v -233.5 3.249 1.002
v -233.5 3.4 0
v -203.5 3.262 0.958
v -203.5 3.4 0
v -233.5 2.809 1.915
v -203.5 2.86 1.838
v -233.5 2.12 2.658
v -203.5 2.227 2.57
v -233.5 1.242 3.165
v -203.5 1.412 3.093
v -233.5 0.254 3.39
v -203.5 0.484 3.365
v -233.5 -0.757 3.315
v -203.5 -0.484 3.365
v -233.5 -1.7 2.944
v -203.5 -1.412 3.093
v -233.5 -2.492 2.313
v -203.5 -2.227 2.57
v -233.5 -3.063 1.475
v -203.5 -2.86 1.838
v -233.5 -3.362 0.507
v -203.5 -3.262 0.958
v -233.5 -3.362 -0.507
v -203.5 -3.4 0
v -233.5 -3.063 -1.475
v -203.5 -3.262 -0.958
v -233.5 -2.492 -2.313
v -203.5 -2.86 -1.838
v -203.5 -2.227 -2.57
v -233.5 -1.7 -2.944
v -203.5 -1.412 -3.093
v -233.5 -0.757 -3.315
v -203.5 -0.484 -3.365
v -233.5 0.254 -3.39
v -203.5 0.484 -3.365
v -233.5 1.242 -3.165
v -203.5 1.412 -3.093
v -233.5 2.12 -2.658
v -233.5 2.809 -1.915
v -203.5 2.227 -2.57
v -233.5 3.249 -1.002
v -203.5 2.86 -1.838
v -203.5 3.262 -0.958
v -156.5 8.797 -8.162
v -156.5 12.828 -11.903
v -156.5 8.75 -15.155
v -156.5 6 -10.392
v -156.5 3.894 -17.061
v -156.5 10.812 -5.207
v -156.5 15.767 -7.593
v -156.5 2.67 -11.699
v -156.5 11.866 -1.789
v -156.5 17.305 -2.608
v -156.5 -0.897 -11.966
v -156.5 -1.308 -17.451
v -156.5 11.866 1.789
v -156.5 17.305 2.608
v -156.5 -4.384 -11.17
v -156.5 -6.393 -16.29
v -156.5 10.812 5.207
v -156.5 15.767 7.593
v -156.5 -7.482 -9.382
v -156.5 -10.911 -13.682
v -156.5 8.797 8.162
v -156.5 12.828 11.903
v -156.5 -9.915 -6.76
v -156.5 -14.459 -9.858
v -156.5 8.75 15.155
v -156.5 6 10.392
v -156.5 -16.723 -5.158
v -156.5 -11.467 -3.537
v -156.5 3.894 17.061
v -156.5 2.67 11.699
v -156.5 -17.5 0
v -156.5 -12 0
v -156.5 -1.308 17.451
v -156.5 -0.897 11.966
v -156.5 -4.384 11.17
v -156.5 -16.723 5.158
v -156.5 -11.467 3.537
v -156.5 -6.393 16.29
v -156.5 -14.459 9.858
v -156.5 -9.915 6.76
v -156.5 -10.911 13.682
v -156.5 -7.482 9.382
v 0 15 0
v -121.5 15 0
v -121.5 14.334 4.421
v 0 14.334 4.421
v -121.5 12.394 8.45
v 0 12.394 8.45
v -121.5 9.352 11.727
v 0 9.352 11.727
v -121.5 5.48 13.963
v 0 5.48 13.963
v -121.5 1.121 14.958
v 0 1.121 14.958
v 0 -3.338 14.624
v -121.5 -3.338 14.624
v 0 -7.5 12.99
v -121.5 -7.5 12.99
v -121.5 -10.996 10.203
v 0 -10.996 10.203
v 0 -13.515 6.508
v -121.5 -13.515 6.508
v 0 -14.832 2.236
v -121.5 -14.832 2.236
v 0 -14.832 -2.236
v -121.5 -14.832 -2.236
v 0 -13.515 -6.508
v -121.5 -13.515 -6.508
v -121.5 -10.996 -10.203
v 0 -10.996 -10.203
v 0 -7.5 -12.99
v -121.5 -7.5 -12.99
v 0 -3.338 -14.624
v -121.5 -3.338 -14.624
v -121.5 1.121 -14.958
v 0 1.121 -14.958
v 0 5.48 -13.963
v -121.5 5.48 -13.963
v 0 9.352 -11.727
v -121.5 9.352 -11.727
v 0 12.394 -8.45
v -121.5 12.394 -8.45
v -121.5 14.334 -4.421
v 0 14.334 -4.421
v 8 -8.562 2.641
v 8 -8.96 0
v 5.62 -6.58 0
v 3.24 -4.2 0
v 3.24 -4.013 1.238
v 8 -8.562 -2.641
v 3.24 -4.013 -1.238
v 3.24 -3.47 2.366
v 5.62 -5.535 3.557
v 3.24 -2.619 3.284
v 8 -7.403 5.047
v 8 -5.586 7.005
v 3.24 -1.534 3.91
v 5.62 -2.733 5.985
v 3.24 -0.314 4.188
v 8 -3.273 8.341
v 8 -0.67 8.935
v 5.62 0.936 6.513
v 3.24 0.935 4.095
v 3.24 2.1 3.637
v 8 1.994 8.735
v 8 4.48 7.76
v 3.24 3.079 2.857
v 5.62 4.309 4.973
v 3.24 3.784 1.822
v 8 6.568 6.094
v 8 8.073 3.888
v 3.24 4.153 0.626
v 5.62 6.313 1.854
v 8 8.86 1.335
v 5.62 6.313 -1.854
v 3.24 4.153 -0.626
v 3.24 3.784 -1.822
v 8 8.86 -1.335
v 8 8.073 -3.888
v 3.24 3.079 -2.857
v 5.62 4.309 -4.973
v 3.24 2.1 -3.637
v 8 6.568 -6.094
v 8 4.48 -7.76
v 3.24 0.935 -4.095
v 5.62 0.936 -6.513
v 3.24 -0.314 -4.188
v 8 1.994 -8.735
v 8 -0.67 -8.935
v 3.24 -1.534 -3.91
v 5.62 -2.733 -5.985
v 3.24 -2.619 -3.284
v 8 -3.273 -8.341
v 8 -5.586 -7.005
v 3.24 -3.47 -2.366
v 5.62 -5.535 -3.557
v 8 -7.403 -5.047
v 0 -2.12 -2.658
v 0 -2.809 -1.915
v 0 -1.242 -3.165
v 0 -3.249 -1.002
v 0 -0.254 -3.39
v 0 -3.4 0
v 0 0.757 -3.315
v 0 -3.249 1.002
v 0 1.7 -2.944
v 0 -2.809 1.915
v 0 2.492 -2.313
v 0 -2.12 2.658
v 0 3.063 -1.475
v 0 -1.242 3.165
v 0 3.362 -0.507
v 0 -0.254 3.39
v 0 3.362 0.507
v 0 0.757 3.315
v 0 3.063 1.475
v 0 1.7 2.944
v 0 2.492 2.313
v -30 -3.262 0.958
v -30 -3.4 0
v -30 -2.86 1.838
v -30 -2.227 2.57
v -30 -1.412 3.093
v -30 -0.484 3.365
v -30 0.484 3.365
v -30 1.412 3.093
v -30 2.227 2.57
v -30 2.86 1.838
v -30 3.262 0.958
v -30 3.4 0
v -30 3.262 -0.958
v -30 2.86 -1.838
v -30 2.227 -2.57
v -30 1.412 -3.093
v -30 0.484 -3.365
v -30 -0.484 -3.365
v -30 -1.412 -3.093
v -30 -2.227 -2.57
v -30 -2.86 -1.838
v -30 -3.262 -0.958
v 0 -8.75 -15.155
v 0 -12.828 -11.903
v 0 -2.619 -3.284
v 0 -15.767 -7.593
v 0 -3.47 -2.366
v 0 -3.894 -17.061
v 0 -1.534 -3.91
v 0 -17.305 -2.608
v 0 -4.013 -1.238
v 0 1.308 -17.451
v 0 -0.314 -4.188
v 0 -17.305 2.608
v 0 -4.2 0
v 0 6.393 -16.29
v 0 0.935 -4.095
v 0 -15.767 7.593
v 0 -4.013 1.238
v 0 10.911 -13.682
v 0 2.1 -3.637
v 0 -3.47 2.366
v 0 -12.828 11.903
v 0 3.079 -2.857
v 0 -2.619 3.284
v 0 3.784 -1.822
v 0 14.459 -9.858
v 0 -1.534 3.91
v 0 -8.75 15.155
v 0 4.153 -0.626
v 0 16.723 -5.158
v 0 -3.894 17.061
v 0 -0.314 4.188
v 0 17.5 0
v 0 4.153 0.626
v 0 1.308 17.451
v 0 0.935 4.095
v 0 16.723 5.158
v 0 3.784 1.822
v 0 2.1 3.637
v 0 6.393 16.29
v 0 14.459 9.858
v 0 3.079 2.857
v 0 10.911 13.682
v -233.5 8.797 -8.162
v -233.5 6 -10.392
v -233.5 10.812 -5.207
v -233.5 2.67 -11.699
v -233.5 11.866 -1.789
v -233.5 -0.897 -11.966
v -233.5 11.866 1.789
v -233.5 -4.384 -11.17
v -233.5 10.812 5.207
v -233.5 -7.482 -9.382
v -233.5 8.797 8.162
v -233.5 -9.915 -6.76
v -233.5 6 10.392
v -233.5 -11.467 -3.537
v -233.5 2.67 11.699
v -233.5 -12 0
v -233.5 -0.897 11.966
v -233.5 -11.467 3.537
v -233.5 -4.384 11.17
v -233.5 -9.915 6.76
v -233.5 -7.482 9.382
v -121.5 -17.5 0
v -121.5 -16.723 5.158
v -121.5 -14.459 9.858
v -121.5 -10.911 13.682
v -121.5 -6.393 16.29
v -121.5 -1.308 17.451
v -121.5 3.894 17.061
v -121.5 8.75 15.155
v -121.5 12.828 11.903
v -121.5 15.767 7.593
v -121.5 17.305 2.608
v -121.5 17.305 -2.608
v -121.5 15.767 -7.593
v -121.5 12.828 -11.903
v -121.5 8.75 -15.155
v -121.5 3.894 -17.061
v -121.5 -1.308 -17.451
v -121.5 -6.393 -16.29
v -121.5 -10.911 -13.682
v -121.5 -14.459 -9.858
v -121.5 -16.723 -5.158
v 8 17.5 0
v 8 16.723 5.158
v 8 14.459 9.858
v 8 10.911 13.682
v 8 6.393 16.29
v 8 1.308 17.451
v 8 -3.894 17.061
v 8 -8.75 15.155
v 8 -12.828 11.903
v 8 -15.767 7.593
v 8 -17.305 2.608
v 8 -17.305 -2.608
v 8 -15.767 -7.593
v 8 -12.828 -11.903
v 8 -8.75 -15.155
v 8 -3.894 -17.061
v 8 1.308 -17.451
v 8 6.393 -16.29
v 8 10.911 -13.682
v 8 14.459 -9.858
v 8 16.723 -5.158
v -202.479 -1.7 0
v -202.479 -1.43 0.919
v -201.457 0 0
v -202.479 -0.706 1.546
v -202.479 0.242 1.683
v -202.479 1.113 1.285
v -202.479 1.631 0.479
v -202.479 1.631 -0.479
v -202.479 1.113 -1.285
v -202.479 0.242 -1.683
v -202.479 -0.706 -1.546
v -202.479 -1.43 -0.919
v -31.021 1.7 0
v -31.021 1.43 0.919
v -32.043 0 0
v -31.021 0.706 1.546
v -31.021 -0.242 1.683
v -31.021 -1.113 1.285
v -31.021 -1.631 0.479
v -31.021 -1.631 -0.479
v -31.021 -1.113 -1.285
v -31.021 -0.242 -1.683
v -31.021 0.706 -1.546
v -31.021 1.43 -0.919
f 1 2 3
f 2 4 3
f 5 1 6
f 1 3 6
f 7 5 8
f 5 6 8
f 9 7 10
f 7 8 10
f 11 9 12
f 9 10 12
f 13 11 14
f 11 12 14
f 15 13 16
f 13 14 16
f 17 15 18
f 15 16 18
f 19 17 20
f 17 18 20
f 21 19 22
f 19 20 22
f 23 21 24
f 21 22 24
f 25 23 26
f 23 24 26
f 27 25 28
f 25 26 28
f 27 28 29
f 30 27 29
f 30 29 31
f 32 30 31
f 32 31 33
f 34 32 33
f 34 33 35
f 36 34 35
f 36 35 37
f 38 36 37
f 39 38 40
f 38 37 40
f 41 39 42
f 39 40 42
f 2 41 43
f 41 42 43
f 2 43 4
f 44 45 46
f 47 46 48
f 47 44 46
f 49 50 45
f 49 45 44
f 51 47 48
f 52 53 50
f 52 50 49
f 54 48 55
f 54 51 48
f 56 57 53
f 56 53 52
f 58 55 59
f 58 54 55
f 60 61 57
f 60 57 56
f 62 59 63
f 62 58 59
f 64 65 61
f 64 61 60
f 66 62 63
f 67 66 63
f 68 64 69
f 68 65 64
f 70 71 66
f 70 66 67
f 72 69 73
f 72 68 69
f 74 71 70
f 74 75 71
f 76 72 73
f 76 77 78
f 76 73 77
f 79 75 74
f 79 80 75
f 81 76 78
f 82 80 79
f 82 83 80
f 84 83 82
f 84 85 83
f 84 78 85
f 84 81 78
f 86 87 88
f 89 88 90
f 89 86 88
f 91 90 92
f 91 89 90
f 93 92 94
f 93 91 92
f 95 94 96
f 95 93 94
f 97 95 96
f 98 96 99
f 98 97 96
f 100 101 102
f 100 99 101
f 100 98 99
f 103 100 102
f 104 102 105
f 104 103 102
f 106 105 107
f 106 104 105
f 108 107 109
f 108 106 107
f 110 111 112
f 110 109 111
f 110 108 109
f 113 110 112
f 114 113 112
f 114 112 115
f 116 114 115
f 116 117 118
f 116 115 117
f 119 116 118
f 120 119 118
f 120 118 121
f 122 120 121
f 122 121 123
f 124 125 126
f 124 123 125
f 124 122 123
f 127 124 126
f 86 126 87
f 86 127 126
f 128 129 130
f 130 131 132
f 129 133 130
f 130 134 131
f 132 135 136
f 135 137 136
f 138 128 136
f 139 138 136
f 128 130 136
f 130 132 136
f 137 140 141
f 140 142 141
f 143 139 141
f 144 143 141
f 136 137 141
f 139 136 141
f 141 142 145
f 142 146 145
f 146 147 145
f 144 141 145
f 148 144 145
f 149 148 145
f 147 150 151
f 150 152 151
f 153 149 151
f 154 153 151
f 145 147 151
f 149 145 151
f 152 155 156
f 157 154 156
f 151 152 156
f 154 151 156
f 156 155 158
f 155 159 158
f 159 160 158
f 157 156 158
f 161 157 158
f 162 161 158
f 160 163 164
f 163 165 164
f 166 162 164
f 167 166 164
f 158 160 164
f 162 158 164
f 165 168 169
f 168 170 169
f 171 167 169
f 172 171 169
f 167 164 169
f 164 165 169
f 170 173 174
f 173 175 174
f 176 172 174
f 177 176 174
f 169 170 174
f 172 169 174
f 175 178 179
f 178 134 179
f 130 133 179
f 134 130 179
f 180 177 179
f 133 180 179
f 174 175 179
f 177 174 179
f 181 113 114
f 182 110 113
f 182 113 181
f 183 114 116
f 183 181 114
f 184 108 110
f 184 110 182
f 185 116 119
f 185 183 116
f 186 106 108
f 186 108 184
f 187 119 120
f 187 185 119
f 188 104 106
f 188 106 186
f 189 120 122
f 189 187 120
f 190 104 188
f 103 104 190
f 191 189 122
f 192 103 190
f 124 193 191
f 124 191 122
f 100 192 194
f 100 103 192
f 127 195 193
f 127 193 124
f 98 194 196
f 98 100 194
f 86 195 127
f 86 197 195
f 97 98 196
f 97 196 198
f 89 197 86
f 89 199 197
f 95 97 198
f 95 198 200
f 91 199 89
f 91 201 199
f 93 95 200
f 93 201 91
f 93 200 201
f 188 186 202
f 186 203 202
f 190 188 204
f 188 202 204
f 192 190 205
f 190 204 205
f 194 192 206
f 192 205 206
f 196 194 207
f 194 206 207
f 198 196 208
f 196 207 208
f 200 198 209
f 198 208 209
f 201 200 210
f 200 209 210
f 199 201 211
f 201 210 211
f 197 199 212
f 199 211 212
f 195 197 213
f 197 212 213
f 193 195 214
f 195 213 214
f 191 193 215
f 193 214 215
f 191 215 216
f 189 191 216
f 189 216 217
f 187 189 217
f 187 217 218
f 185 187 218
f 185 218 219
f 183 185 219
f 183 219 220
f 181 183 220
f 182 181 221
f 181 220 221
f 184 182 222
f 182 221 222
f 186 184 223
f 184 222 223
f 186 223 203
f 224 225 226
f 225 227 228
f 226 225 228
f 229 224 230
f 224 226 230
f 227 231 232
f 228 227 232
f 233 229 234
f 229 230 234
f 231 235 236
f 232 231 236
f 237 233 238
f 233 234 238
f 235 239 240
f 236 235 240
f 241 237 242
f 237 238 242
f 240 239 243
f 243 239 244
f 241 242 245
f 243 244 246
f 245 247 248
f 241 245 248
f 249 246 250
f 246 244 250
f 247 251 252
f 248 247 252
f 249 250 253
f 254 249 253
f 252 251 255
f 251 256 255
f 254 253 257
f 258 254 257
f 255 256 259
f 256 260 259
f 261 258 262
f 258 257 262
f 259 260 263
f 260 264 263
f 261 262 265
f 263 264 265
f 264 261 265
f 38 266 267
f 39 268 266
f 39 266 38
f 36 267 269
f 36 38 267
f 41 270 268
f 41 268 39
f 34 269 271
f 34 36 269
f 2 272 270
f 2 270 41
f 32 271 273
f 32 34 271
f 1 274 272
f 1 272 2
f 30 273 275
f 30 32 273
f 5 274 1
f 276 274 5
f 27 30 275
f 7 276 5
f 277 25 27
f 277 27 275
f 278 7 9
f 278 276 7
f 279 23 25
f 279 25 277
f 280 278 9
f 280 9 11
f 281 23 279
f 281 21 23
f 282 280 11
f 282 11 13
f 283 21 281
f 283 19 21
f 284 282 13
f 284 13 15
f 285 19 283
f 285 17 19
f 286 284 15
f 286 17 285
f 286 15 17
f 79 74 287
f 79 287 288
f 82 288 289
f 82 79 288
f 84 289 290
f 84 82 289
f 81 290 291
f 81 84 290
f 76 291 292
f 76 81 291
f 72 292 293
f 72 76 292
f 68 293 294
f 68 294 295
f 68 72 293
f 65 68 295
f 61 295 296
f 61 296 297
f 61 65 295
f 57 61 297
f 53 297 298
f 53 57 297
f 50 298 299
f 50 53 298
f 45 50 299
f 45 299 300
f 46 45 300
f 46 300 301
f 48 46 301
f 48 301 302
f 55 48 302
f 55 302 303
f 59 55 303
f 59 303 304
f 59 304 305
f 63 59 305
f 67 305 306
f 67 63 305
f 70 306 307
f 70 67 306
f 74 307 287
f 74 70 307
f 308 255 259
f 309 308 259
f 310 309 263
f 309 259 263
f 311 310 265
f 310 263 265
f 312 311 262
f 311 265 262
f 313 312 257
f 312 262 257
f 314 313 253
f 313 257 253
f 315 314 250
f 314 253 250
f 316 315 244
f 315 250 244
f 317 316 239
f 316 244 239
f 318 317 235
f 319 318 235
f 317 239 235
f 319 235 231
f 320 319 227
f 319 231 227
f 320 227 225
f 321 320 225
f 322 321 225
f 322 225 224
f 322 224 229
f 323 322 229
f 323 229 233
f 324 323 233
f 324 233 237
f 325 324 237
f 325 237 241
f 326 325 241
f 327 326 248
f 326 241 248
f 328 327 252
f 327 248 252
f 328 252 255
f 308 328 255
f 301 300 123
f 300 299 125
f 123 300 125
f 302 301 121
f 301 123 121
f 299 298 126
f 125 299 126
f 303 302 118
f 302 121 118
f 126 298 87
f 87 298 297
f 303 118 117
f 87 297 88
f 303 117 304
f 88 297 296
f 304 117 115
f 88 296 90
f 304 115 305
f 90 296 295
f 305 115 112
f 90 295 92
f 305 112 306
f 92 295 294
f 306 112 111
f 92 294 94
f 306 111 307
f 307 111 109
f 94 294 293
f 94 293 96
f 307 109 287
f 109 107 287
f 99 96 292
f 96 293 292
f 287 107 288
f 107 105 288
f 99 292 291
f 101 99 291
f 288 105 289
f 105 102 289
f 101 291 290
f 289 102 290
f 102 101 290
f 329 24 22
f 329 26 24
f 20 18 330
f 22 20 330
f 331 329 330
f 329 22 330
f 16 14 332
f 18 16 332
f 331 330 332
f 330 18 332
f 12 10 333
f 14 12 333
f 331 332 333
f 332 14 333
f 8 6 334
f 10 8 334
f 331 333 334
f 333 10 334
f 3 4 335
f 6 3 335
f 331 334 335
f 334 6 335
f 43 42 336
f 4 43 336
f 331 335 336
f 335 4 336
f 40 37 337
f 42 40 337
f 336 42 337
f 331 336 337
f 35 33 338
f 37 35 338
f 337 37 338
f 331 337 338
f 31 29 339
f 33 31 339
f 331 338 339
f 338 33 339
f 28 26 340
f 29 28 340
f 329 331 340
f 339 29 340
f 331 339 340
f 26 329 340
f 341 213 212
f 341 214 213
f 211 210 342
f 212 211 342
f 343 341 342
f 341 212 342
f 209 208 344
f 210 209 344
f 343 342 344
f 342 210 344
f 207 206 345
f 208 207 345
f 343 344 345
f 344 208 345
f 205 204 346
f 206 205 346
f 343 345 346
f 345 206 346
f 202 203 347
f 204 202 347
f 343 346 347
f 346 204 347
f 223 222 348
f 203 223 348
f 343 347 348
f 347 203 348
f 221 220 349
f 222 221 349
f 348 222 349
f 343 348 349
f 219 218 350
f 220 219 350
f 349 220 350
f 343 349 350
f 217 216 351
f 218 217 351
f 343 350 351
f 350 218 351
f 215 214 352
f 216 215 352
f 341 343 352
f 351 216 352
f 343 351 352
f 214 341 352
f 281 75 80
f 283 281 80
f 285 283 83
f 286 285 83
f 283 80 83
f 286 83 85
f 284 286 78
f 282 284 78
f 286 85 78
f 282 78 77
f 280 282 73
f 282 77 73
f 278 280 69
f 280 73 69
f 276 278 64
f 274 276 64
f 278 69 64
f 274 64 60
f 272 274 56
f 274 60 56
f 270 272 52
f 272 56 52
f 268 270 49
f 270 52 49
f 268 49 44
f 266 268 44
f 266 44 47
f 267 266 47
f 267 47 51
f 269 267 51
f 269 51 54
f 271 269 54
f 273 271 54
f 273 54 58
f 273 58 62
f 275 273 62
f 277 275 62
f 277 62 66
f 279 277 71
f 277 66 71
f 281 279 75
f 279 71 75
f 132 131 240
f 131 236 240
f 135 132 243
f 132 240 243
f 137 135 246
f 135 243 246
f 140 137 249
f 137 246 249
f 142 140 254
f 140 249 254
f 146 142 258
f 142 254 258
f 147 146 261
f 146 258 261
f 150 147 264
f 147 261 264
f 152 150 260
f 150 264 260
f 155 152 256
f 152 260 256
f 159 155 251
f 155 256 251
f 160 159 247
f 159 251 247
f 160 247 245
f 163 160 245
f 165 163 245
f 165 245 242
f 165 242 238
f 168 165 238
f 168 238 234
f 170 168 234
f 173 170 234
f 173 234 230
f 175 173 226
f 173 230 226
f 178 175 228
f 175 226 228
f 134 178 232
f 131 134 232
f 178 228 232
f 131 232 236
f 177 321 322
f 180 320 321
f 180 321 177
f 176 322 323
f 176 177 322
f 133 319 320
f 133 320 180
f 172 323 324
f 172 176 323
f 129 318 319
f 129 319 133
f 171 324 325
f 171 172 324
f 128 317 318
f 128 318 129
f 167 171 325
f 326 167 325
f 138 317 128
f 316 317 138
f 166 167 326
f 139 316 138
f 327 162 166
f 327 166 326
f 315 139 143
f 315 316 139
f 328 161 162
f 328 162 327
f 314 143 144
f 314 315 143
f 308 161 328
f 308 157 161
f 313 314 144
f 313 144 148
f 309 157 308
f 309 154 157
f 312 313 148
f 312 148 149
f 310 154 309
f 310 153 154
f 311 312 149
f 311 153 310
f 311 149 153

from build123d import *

# Parameters (mm, degrees)
F0_R            = 15
F1_DEPTH        = 156.5
F2_R            = 12
F3_DEPTH        = 77
F5_D            = 6.8
F5_DEPTH        = 30
F5_TIP          = 2.0429261047
F6_R            = 17.5
F6_R_2          = 15
F7_DEPTH        = 35
F8_D            = 6.8
F8_DEPTH        = 30
F8_TIP          = 2.0429261047
F9_R            = 17.5
F10_DEPTH       = 8
F12_D           = 8.4
F12_DEPTH       = 30
F12_CSINK_D     = 17.92
F12_CSINK_ANGLE = 90
F12_TIP         = 2.5236145999


with BuildPart() as f1:
    # F0 (on Right) → F1 (new body)
    with BuildSketch(Plane.YZ):
        Circle(F0_R)
    extrude(amount=-F1_DEPTH)

    # F2 (on face) → F3 (join)
    with BuildSketch(Plane(origin=(-156.5, 0, 0), x_dir=(0, -1, 0), z_dir=(-1, 0, 0))):
        Circle(F2_R)
    extrude(amount=F3_DEPTH)

    # F5
    with Locations(Plane(origin=(-233.5, 0, 0), x_dir=(0, -1, 0), z_dir=(-1, 0, 0))):
        with Locations((0, 0)):
            Hole(F5_D / 2, depth=F5_DEPTH)
            with Locations((0, 0, -(F5_DEPTH + F5_TIP / 2))):  # 118° drill point
                Cone(0, F5_D / 2, F5_TIP, mode=Mode.SUBTRACT)

    # F6 (on face) → F7 (join)
    with BuildSketch(Plane(origin=(-156.5, 0, 0), x_dir=(0, -1, 0), z_dir=(-1, 0, 0))):
        Circle(F6_R)
        Circle(F6_R_2, mode=Mode.SUBTRACT)
    extrude(amount=-F7_DEPTH)

    # F8
    with Locations(Plane.YZ):
        with Locations((0, 0)):
            Hole(F8_D / 2, depth=F8_DEPTH)
            with Locations((0, 0, -(F8_DEPTH + F8_TIP / 2))):  # 118° drill point
                Cone(0, F8_D / 2, F8_TIP, mode=Mode.SUBTRACT)


with BuildPart() as f10:
    # F9 (on Right) → F10 (new body)
    with BuildSketch(Plane.YZ):
        Circle(F9_R)
    extrude(amount=F10_DEPTH)

    # F12
    with Locations(Plane.YZ.offset(8)):
        with Locations((0, 0)):
            CounterSinkHole(F12_D / 2, F12_CSINK_D / 2, depth=F12_DEPTH, counter_sink_angle=F12_CSINK_ANGLE)
            with Locations((0, 0, -(F12_DEPTH + F12_TIP / 2))):  # 118° drill point
                Cone(0, F12_D / 2, F12_TIP, mode=Mode.SUBTRACT)


solid = Compound([f1.part, f10.part])
